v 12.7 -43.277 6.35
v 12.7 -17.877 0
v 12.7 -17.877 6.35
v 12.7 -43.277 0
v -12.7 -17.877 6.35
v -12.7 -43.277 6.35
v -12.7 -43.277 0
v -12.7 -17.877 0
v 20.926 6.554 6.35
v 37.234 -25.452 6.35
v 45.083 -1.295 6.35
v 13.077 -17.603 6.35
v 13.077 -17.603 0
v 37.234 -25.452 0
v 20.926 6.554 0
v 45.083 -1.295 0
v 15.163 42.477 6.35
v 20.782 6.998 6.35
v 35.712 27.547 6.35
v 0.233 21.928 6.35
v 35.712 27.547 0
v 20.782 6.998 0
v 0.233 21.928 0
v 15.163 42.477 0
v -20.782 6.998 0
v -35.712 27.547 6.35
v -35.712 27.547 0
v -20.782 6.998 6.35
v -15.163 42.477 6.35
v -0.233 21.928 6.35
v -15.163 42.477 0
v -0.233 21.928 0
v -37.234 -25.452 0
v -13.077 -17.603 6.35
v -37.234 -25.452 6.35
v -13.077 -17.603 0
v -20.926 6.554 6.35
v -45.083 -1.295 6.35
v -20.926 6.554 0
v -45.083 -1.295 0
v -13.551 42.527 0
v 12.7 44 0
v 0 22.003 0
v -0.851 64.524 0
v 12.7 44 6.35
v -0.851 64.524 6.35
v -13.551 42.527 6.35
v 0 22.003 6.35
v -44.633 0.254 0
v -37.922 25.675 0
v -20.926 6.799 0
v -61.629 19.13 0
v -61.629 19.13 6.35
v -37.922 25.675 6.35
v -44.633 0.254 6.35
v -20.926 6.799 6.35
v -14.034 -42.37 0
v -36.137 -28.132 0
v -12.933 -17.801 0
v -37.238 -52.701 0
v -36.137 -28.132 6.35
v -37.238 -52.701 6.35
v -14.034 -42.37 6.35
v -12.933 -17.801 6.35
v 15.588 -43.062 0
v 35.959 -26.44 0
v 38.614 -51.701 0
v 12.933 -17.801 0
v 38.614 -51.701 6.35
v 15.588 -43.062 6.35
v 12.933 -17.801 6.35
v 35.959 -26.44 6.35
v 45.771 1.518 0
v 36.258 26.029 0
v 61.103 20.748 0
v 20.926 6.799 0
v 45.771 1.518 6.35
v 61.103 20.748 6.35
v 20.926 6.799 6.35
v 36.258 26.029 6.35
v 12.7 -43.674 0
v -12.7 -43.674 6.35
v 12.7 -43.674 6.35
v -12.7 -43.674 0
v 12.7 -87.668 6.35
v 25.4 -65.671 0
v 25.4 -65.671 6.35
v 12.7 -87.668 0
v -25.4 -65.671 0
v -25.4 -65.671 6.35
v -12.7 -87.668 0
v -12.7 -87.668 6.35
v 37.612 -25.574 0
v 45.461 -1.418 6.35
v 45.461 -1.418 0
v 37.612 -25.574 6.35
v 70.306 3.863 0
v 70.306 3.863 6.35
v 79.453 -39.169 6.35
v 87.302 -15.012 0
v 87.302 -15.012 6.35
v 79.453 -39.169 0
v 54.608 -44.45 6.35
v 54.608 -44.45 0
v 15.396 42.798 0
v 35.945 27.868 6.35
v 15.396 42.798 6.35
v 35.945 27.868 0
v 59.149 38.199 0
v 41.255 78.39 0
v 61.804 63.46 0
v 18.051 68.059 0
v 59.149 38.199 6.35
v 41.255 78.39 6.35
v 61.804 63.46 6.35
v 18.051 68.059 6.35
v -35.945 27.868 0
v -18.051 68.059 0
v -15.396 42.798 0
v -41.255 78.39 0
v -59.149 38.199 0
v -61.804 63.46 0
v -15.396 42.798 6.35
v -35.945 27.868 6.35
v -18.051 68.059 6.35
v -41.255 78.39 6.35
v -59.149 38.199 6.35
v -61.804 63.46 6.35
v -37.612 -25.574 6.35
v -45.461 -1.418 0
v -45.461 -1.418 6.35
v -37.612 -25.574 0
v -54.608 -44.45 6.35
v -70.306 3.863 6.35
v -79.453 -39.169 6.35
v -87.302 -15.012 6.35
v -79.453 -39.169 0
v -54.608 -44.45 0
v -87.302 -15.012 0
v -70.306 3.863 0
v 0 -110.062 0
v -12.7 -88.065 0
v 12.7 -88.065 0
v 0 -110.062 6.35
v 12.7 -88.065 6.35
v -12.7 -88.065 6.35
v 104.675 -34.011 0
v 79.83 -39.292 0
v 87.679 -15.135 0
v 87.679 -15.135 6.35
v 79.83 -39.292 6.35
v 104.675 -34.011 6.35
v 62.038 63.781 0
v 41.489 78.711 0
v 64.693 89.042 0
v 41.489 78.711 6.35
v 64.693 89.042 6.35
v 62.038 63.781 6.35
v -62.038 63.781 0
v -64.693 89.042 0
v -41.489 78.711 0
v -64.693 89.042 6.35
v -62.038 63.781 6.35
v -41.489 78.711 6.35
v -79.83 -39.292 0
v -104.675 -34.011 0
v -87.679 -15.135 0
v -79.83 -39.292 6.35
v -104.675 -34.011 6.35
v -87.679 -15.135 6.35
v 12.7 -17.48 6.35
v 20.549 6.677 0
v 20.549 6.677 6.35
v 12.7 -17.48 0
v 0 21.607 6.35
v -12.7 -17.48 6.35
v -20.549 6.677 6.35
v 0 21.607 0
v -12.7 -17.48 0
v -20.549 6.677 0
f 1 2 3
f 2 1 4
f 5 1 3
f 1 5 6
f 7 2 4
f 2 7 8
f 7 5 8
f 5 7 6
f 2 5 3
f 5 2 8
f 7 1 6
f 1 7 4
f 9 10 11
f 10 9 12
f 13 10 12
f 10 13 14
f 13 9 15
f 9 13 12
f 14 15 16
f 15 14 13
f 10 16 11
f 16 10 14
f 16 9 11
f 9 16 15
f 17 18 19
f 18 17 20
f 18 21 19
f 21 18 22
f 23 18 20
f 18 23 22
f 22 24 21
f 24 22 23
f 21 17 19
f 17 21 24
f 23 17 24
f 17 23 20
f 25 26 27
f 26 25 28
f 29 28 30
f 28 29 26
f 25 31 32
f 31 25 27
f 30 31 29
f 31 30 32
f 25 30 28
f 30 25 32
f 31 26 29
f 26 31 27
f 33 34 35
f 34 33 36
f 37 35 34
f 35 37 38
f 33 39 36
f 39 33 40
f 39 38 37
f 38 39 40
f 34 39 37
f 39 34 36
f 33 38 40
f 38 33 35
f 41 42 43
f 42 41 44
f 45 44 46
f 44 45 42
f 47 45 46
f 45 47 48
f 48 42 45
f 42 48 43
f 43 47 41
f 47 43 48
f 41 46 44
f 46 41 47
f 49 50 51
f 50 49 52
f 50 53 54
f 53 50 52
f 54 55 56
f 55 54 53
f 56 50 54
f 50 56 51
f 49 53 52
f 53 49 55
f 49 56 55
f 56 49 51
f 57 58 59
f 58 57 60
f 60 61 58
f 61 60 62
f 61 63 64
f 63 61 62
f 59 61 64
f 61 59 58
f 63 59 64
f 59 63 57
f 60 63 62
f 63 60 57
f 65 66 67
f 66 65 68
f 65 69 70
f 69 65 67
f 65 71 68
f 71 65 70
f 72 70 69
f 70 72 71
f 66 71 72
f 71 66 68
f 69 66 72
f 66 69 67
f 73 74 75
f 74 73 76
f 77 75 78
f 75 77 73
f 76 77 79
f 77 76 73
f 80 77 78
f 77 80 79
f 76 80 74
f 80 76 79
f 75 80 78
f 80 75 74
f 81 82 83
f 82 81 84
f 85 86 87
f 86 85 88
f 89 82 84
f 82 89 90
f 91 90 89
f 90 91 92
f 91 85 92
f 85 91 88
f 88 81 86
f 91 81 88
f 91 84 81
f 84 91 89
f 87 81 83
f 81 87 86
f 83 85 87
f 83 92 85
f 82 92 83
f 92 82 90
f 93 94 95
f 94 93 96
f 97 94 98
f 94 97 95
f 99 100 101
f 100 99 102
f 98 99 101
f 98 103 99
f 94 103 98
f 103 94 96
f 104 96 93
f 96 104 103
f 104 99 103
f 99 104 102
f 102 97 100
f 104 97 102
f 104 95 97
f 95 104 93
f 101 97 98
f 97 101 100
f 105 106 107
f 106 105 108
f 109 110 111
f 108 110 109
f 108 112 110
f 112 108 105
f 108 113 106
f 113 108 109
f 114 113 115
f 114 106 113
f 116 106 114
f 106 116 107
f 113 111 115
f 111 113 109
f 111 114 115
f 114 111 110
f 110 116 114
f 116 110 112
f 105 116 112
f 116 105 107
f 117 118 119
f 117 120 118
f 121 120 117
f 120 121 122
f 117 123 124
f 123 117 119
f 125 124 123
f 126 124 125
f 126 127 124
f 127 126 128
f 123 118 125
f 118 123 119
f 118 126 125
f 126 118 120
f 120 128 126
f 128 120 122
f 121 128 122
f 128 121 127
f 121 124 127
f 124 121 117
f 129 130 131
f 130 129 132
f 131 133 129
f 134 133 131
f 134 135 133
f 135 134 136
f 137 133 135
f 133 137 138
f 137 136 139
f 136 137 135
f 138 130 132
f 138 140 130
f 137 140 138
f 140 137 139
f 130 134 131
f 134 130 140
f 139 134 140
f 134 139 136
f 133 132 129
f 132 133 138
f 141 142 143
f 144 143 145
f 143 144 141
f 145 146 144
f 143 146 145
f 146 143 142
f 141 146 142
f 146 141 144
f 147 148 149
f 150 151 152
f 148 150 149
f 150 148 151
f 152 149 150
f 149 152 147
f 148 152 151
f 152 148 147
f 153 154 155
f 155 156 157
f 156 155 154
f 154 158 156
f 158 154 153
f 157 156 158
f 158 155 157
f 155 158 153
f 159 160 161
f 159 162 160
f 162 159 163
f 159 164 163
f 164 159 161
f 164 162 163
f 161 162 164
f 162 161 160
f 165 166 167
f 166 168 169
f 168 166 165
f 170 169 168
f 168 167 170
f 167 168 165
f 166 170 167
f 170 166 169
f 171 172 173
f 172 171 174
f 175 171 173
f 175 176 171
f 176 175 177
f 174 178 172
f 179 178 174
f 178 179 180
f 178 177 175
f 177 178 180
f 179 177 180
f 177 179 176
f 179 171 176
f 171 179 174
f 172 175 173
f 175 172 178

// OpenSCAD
inch=25.4;
space=1/64*inch;

tri=tan(30)*(0.5*inch);
tri_long=inch/2*sqrt(3)-tan(30)*(0.5*inch);
pent=sqrt(pow(0.5*inch/sin(36),2)-pow(0.5*inch,2));
hex=sqrt(3)*inch;


function ngon(count, radius, i = 0, result = []) = i < count
    ? ngon(count, radius, i + 1, concat(result, [[ radius*sin(360/count*i), radius*cos(360/count*i) ]]))
    : result;



module orange(){
    color([1,0.66,0])
    translate([-0.5*inch,-0.5*inch,0])
    cube([1*inch,1*inch,0.25*inch]);
}

module yellow(){
    color([1,1,0])
    linear_extrude(0.25*inch,convexity=10)
    polygon(ngon(6,inch));
}

module purple(){
    color([0.8,0,0.8])
    linear_extrude(0.25*inch,convexity=10)
    polygon(ngon(5,0.5*inch/sin(36)));
}

module blue(){
    color([0.0,0,0.8])
    rotate([0,0,-30+90])
    linear_extrude(0.25*inch,convexity=10)
    polygon([
    [0,0],
    [inch,0],
    [inch+inch*sqrt(3)/4,inch*sqrt(3)/2],
    [inch*sqrt(3)/4,inch*sqrt(3)/2]
    ]);
}

module green(){
  color([0,0.6,0])
    rotate([0,0,60])
    linear_extrude(0.25*inch,convexity=10)
    polygon(ngon(3,tri_long));
}

for (i=[0:4]){
    rotate([0,0,i*360/5])
    translate([0,-inch/2-sqrt(pow(0.5*inch/sin(36),2)-pow(0.5*inch,2))-space,0])
    rotate([0,0,0])
    orange();
}

for (i=[0:4]){
    rotate([0,0,i*360/5])
    translate([0,inch/sin(36)/2+space,0])
    blue();
}

for (i=[0:4]){
    rotate([0,0,i*360/5])
    translate([0,-pent-inch-hex/2-space*2,0])
    rotate([0,0,30])
    yellow();
}

for (i=[0:4]){
    rotate([0,0,i*360/5])
    translate([0,-pent-tri-space-inch-space-hex-space,0])
    rotate([0,0,0])
    green();
}

purple();
